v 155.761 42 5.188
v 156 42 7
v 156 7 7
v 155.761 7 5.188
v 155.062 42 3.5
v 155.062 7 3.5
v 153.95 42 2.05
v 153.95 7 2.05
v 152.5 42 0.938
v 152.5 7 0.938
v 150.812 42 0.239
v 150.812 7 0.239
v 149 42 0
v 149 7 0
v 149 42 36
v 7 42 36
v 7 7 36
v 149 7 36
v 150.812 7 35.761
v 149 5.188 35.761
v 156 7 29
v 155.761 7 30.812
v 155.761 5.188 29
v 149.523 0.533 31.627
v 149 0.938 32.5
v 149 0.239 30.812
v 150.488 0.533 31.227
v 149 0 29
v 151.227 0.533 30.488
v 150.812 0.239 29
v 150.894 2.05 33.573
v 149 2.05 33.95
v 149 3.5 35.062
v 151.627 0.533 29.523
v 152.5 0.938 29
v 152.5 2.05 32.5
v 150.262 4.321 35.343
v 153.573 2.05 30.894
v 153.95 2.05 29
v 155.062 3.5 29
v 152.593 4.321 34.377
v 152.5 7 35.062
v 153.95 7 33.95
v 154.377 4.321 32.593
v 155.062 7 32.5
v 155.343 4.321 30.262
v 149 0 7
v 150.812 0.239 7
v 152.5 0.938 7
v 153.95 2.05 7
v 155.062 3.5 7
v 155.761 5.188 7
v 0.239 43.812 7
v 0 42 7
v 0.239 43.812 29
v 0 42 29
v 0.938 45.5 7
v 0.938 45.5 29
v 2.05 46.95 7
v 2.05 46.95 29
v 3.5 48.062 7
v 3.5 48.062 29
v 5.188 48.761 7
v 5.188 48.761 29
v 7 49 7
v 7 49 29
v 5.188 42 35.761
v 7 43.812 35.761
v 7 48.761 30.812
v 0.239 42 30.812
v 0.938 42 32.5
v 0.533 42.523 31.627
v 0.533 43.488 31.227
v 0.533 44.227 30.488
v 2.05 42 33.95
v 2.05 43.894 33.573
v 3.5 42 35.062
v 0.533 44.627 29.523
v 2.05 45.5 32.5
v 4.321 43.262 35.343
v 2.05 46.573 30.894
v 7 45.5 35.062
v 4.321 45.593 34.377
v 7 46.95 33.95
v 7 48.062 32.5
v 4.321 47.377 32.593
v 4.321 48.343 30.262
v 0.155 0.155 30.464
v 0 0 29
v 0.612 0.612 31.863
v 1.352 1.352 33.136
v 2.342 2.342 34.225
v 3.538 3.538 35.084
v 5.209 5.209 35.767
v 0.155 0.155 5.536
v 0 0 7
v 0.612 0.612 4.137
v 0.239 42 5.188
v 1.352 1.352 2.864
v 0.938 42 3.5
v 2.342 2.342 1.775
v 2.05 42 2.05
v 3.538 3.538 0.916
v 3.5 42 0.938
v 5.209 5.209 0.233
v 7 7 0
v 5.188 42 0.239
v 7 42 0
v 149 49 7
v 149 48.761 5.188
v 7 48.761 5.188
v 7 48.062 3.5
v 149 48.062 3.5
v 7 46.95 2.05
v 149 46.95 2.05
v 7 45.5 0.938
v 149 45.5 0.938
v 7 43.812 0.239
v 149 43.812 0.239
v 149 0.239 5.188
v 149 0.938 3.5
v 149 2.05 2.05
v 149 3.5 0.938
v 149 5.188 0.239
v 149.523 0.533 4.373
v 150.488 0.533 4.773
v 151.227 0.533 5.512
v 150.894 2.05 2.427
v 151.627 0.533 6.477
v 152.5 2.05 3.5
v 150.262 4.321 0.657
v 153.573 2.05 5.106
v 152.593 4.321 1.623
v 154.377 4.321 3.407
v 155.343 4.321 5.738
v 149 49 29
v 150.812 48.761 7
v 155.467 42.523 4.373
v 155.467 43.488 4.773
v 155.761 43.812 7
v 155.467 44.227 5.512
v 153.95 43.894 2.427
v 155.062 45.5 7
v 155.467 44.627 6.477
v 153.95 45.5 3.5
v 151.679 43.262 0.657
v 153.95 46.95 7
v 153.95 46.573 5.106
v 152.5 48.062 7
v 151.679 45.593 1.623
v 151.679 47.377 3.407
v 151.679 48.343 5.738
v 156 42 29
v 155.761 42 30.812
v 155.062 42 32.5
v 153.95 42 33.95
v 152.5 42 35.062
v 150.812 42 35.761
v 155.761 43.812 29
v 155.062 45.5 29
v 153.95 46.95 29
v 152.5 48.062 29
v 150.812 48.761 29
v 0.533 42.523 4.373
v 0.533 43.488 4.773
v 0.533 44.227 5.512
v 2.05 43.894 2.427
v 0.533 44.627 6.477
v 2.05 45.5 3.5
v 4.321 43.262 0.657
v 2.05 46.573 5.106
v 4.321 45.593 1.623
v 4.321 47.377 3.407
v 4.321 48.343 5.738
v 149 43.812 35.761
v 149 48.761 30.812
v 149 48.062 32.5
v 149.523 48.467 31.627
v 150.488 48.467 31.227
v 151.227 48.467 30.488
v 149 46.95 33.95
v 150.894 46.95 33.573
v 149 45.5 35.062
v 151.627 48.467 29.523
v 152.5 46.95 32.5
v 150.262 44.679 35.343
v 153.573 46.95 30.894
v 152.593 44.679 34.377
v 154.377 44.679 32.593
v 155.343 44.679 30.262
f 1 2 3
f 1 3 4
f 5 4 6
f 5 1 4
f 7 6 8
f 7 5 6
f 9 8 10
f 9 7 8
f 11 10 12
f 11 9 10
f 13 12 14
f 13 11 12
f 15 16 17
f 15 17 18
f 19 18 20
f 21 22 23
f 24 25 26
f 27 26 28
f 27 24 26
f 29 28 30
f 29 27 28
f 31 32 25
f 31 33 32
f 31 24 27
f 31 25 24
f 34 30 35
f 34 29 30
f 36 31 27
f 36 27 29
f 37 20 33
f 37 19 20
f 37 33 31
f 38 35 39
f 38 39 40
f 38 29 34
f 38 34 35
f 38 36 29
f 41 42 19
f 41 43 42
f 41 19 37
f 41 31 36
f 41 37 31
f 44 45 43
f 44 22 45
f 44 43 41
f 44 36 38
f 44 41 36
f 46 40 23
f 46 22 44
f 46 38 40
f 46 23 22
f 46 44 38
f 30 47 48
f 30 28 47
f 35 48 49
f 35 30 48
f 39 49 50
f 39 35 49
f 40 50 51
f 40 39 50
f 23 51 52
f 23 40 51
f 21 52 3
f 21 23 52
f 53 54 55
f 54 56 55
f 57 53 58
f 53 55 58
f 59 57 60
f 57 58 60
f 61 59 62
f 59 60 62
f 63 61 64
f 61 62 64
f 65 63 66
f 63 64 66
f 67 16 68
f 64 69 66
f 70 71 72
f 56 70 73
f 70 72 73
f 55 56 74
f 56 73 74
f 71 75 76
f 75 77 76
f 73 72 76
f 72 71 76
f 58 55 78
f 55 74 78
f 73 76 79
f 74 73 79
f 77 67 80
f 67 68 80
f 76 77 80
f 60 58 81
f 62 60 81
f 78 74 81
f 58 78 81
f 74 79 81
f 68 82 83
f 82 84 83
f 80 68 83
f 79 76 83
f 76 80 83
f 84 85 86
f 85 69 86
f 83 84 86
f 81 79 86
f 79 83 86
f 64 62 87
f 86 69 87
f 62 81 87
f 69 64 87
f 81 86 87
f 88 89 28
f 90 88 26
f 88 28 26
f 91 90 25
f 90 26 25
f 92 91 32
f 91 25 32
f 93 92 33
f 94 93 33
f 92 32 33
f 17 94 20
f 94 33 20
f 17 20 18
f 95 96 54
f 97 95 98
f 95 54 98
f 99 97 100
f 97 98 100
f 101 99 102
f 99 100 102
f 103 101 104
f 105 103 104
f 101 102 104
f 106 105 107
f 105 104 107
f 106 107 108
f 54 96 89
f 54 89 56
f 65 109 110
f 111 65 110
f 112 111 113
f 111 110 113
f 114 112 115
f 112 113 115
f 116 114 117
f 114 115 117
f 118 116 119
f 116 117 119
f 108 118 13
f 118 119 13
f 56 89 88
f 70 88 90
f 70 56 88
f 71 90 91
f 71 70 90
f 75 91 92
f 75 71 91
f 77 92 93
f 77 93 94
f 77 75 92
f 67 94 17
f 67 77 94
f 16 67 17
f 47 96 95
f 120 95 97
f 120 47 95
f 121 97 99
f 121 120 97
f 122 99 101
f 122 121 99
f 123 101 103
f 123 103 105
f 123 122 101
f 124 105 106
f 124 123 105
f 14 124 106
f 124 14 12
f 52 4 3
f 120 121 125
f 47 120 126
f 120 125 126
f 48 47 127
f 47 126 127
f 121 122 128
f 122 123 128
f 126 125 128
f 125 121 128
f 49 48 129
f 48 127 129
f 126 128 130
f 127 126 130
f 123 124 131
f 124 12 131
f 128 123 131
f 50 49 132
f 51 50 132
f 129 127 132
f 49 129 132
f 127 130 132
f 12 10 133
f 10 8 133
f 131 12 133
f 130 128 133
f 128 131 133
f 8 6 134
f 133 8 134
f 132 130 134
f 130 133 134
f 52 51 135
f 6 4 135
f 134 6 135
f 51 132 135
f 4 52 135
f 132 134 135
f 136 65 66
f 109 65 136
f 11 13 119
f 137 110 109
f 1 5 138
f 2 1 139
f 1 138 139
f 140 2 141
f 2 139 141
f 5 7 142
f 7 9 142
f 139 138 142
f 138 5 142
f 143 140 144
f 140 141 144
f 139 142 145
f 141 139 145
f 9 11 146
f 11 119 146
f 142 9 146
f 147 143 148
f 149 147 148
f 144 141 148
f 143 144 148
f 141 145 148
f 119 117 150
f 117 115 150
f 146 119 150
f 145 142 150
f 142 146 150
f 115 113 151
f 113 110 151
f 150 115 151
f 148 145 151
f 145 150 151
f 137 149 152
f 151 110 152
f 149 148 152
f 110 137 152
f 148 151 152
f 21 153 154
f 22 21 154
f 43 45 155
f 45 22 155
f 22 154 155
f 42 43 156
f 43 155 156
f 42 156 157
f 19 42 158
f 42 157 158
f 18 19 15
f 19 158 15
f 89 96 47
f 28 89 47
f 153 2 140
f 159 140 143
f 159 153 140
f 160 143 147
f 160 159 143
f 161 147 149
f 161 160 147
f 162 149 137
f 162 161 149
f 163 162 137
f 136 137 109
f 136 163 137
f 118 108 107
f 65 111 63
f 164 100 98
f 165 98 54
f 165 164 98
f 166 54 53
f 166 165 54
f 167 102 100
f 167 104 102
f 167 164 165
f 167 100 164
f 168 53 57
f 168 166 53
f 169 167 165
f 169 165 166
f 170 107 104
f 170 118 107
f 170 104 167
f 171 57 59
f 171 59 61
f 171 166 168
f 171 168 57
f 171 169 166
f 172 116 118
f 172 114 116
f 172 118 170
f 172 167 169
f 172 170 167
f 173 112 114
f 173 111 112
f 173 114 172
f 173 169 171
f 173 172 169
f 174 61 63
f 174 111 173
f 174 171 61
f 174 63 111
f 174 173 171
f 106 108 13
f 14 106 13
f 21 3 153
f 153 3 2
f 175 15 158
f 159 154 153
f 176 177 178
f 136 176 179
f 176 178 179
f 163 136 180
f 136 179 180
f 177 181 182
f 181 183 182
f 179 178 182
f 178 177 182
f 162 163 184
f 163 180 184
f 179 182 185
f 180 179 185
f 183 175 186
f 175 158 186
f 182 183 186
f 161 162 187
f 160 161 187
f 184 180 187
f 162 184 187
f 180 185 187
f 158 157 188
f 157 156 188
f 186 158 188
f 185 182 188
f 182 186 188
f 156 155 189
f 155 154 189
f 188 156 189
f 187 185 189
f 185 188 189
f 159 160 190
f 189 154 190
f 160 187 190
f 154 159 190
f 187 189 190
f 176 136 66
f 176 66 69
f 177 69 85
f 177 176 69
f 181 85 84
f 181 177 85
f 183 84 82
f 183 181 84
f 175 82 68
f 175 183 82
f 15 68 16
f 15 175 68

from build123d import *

# Parameters (mm, degrees)
SKETCH1_W           = 156
SKETCH1_H           = 49
BOSS_EXTRUDE1_DEPTH = 36
FILLET1_R           = 7


with BuildPart() as part:
    # Sketch1 → Boss-Extrude1 (new body)
    with BuildSketch(Plane.XY):
        with Locations((78, 24.5)):
            Rectangle(SKETCH1_W, SKETCH1_H)
    extrude(amount=BOSS_EXTRUDE1_DEPTH)

    # Fillet1
    fillet1_edges = [part.edges().sort_by_distance(p)[0] for p in [
        (156, 24.5, 36),
        (78, 49, 36),
        (0, 24.5, 36),
        (78, 49, 0),
        (156, 24.5, 0),
        (78, 0, 0),
        (0, 24.5, 0),
        (78, 0, 36),
        (0, 49, 18),
        (156, 49, 18),
        (156, 0, 18),
    ]]
    fillet(fillet1_edges, radius=FILLET1_R)


solid = part.part
